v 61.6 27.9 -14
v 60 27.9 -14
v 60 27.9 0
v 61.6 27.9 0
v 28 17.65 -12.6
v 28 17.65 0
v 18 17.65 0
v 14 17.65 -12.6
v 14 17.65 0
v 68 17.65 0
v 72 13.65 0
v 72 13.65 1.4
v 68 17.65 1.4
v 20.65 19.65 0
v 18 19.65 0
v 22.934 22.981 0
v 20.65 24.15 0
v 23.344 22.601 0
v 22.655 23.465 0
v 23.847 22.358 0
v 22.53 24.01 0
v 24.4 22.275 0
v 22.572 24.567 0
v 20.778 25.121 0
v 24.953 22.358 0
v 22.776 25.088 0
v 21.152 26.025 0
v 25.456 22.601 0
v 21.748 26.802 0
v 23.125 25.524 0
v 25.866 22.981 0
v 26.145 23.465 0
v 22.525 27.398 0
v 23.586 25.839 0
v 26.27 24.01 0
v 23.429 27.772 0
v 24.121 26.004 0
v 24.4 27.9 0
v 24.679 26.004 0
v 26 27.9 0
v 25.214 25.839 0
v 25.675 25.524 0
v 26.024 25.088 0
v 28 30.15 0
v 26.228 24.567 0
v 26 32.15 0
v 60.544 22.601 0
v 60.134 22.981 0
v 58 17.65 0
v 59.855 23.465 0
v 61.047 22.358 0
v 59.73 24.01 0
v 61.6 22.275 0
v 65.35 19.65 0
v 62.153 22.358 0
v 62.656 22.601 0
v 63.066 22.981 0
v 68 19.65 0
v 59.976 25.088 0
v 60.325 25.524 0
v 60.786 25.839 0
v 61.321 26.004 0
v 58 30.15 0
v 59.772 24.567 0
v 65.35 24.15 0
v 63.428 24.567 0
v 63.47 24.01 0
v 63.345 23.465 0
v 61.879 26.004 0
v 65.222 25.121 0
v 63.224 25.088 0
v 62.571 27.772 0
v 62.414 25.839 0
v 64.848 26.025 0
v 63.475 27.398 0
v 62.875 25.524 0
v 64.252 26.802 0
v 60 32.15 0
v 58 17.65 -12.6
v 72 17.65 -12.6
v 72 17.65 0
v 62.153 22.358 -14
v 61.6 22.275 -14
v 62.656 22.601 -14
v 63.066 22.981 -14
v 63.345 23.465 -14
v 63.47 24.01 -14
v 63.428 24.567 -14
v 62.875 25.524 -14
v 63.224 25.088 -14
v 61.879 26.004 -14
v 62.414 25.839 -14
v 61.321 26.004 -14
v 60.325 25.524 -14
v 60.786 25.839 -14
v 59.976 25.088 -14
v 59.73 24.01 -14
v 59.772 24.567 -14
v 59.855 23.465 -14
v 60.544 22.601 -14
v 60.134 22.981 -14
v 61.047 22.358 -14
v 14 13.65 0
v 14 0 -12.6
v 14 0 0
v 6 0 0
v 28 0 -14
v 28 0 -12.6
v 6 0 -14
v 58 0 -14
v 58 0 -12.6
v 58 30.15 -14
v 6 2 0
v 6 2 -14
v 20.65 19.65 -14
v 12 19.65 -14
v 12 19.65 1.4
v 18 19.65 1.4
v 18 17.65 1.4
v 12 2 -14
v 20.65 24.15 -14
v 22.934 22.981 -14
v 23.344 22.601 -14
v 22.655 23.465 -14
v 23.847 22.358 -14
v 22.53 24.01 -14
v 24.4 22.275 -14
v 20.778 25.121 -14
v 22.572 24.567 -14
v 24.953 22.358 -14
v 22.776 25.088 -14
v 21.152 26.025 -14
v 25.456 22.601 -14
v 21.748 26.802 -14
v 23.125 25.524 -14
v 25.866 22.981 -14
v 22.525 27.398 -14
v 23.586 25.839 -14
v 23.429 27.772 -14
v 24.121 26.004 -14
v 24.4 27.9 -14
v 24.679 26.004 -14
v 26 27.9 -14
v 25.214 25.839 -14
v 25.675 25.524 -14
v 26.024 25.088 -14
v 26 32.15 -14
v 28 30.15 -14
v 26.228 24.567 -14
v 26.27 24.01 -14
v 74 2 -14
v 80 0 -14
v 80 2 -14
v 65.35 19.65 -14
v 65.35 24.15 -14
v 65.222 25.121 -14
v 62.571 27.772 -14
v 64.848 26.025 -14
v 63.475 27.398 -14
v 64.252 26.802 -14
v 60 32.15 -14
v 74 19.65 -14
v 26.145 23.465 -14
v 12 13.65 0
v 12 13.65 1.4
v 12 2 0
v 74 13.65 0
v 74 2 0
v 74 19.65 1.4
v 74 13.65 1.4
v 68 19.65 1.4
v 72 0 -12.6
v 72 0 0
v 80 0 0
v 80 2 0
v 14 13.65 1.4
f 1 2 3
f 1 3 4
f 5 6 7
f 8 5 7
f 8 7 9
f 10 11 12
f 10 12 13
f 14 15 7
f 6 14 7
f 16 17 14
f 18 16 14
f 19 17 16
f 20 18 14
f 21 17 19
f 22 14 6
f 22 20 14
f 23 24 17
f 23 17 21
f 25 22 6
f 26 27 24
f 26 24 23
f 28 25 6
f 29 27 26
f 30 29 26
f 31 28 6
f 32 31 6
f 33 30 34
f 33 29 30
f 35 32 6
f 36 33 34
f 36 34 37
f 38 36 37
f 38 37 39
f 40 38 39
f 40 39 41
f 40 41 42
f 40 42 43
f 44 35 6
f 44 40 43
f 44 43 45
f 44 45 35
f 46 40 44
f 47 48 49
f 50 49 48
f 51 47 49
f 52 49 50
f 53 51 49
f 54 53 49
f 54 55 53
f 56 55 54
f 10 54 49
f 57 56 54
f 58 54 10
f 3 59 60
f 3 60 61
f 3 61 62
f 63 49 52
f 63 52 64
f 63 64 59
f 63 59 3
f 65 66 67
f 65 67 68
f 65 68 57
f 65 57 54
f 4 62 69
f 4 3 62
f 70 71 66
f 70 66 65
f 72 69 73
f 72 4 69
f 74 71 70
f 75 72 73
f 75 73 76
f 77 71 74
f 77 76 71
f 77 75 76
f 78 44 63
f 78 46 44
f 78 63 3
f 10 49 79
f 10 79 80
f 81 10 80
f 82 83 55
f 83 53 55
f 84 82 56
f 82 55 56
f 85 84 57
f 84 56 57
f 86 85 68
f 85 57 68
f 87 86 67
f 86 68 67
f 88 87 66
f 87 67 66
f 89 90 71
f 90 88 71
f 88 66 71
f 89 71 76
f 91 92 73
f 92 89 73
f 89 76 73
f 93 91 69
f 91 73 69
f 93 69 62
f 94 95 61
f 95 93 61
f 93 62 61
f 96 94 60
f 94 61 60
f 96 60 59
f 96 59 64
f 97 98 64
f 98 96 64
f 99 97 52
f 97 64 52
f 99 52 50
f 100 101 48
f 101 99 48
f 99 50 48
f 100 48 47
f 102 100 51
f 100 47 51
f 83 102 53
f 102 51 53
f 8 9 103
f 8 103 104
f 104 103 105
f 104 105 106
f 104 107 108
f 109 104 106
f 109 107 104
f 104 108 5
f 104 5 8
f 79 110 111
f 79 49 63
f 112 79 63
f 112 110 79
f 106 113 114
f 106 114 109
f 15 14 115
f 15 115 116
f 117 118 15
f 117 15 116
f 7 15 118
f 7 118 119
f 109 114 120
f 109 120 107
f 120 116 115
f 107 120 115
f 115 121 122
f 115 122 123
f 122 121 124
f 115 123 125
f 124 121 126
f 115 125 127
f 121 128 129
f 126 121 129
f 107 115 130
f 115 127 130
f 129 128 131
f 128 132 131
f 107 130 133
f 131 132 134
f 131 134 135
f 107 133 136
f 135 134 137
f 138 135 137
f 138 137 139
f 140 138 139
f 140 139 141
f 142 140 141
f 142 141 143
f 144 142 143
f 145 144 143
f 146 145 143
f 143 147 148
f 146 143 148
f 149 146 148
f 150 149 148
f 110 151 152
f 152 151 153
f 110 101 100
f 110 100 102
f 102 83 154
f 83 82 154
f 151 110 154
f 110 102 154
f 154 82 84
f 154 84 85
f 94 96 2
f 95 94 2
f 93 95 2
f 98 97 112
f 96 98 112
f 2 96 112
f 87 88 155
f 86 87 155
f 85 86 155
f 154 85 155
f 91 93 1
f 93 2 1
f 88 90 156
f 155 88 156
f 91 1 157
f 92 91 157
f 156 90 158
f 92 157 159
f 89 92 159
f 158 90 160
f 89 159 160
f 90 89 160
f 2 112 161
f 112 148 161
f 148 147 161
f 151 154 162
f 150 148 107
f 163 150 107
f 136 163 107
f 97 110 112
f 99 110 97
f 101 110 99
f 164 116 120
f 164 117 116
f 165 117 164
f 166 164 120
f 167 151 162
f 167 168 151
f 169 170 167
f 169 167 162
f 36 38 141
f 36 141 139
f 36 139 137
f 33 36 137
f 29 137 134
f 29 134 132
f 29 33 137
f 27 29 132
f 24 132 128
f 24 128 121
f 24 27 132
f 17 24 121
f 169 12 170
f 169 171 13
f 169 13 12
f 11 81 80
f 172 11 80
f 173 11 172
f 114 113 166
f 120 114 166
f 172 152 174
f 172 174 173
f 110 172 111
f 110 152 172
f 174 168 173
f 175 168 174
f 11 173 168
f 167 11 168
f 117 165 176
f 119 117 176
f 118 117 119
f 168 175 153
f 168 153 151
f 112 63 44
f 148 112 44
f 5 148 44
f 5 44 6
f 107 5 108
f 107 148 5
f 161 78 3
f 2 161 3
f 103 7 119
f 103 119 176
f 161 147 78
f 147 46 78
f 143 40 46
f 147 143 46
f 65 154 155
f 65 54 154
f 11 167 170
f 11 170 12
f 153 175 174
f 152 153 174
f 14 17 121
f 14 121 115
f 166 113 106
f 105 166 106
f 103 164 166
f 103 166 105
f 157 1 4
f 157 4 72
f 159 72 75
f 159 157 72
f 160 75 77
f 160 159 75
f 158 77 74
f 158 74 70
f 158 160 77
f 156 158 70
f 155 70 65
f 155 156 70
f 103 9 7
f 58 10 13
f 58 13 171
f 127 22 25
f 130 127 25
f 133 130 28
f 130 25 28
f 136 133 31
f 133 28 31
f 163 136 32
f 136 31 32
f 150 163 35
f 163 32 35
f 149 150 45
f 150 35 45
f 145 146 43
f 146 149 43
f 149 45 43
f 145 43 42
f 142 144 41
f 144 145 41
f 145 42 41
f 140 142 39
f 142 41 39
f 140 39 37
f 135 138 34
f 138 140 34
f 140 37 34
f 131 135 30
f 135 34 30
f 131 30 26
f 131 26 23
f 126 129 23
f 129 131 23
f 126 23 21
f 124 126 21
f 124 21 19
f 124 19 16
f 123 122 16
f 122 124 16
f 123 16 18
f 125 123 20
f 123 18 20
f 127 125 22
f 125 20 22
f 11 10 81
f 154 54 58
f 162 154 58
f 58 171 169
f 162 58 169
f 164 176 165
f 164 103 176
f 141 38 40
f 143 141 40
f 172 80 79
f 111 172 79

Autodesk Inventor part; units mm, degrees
ref_plane "YZ Plane" through (0, 0, 0) normal (1, 0, 0) x (0, 1, 0)
ref_plane "XZ Plane" through (0, 0, 0) normal (0, 1, 0) x (-1, 0, 0)
ref_plane "XY Plane" through (0, 0, 0) normal (0, 0, 1) x (1, 0, 0)
sketch "スケッチ1" plane through (0, 0, 0) normal (0, 0, 1) x (1, 0, 0)
  line L0 (0, 0) -> (0, 17.65)
  line L1 (0, 17.65) -> (28, 17.65)
  line L2 (28, 17.65) -> (28, 30.15)
  line L3 (28, 30.15) -> (58, 30.15)
  line L4 (58, 30.15) -> (58, 0)
  line L5 (58, 0) -> (60, 0)
  line L6 (60, 0) -> (60, 32.15)
  line L7 (60, 32.15) -> (28, 32.15)
  line L8 (28, 32.15) -> (26, 32.15)
  line L9 (26, 32.15) -> (26, 19.65)
  line L10 (26, 19.65) -> (-2, 19.65)
  line L11 (-2, 19.65) -> (-2, 0)
  line L12 (-2, 0) -> (0, 0)
  dimension "d0" = 17.65
  dimension "d1" = 28
  dimension "d2" = 12.5
  dimension "d3" = 30
  dimension "d4" = 2
  dimension "d5" = 32.15
  dimension "d6" = 32
  dimension "d7" = 2
  dimension "d8" = 12.5
  dimension "d9" = 28
extrude "押し出し1" add sketch "スケッチ1" along normal blind 14
sketch "スケッチ2" plane through (60, 0, 0) normal (1, 0, 0) x (0, 0, -1)
  line L0 (0, 0) -> (-14, 0) projected
  line L1 (-14, 0) -> (0, 0)
  line L2 (0, 0) -> (0, 2)
  line L3 (0, 2) -> (-14, 2)
  line L4 (-14, 2) -> (-14, 0)
  dimension "d12" = 14
  dimension "d13" = 2
extrude "押し出し2" add sketch "スケッチ2" along normal blind 7
sketch "スケッチ3" plane through (-2, 0, 0) normal (-1, 0, 0) x (0, 0, 1)
  line L0 (14, 2) -> (0, 2) projected
  line L1 (0, 0) -> (14, 0)
  line L2 (14, 0) -> (14, 2)
  line L3 (14, 2) -> (0, 2)
  line L4 (0, 2) -> (0, 0)
  dimension "d16" = 14
extrude "押し出し3" add sketch "スケッチ3" along normal blind 7
sketch "スケッチ4" plane through (0, 0, 14) normal (0, 0, 1) x (1, 0, 0)
  line L0 (60, 32.15) -> (60, 24.15)
  line L1 (60, 24.15) -> (61.6, 24.15)
  arc A0 (61.6, 20.4) -> (61.6, 27.9) centre (61.6, 24.15) ccw
  line L2 (61.6, 24.15) -> (61.6, 20.4) construction
  line L3 (61.6, 24.15) -> (61.6, 27.9) construction
  line L4 (61.6, 27.9) -> (60, 27.9)
  line L5 (61.6, 20.4) -> (60, 20.4)
  line L6 (60, 2) -> (60, 32.15) projected
  line L7 (60, 27.9) -> (60, 20.4)
  point P0 (0, 0)
  dimension "d47" = 8
  dimension "d48" = 1.6
  dimension "d49" = 3.75
  dimension "d50" = 180
extrude "押し出し4" add sketch "スケッチ4" against normal blind 14
hole "穴3" at (61.6, 24.15, 14) direction (0, 0, -1) diameter 3.75 end through all
sketch "スケッチ7" plane through (0, 0, 14) normal (0, 0, 1) x (1, 0, 0)
  line L0 (60, 32.15) -> (26, 32.15) projected
  line L1 (26, 32.15) -> (26, 24.15)
  line L2 (26, 24.15) -> (24.4, 24.15)
  arc A0 (24.4, 27.9) -> (24.4, 20.4) centre (24.4, 24.15) ccw
  line L3 (24.4, 27.9) -> (26, 27.9)
  line L4 (24.4, 20.4) -> (26, 20.4)
  line L5 (26, 20.4) -> (26, 27.9)
  line L6 (26, 32.15) -> (26, 19.65) projected
  circle A1 centre (24.4, 24.15) radius 1.875
  point P0 (0, 0)
  dimension "d60" = 8
  dimension "d61" = 1.6
  dimension "d62" = 3.75
  dimension "d63" = 3.75
extrude "押し出し6" add sketch "スケッチ7" against normal blind 14 contours L1 A1 L5 L4 A0 L3 | L1 L5 A1 picked at (23.6929, 24.15)
hole "穴4" at (24.4, 24.15, 14) direction (0, 0, -1) diameter 3.75 end through all
sketch "スケッチ10" plane through (0, 17.65, 0) normal (0, -1, 0) x (1, 0, 0)
  line L0 (28, 14) -> (58, 14) projected
  line L1 (0, 0) -> (28, 0)
  line L2 (28, 0) -> (28, 14)
  line L3 (28, 14) -> (0, 14)
  line L4 (0, 14) -> (0, 0)
extrude "押し出し7" cut sketch "スケッチ10" against normal blind 0.6
sketch "スケッチ11" plane through (0, 0, 0) normal (0, -1, 0) x (1, 0, 0)
  line L0 (0, 14) -> (-9, 14) projected
  line L1 (60, 0) -> (67, 0) projected
  line L2 (-9, 14) -> (67, 14)
  line L3 (67, 14) -> (67, 0)
  line L4 (67, 0) -> (-9, 0)
  line L5 (-9, 0) -> (-9, 14)
  point P0 (0, 0)
extrude "押し出し8" cut sketch "スケッチ11" against normal blind 0.6
sketch "スケッチ12" plane through (0, 0, 14) normal (0, 0, 1) x (1, 0, 0)
  line L0 (-2, 19.65) -> (-2, 2) projected
  line L1 (-2, 19.65) -> (4, 19.65)
  line L2 (26, 19.65) -> (-2, 19.65) projected
  line L3 (4, 19.65) -> (4, 18.25)
  line L4 (0, 18.25) -> (28, 18.25) projected
  line L5 (4, 18.25) -> (0.2844, 14.5344)
  line L6 (4, 18.25) -> (9.2547, 18.25) construction
  line L7 (0.2844, 14.5344) -> (0, 14.25)
  line L8 (0, 0.6) -> (0, 18.25) projected
  line L9 (0, 14.25) -> (-2, 14.25)
  line L10 (-2, 14.25) -> (-2, 19.65)
  point P0 (0, 0)
  dimension "d79" = 6
  dimension "d80" = 135
extrude "押し出し9" add sketch "スケッチ12" along normal blind 2
sketch "スケッチ15" plane through (0, 0, 0) normal (0, 0, -1) x (-1, 0, 0)
  line L0 (0, 0.6) -> (0, 18.25) projected
  line L1 (0, 18.25) -> (-14, 18.25)
  line L2 (-14, 18.25) -> (-14, 0.6)
  line L3 (-14, 0.6) -> (0, 0.6)
  line L4 (0, 0.6) -> (0, 18.25)
  point P0 (0, 0)
  dimension "d88" = 14
extrude "押し出し11" add sketch "スケッチ15" against normal blind 1.4
sketch "スケッチ17" plane through (67, 0, 0) normal (1, 0, 0) x (0, 0, -1)
  line L0 (0, 0.6) -> (-14, 0.6) projected
  line L1 (0, 0.6) -> (-14, 0.6)
  line L2 (-14, 0.6) -> (-14, 9.5309)
  line L3 (-14, 9.5309) -> (0, 9.5309)
  line L4 (0, 9.5309) -> (0, 0.6)
  point P0 (0, 0)
extrude "押し出し13" cut sketch "スケッチ17" against normal blind 3
sketch "スケッチ18" plane through (-9, 0, 0) normal (-1, 0, 0) x (0, 0, 1)
  line L0 (0, 0.6) -> (14, 0.6) projected
  line L1 (0, 0.6) -> (14, 0.6)
  line L2 (14, 0.6) -> (14, 6.5)
  line L3 (14, 6.5) -> (0, 6.5)
  line L4 (0, 6.5) -> (0, 0.6)
  point P0 (0, 0)
extrude "押し出し14" cut sketch "スケッチ18" against normal blind 3
hole "穴5" at (-4, 2, 7) direction (0, -1, 0) diameter 2.4 end through all
hole "穴6" at (62, 2, 7) direction (0, -1, 0) diameter 2.4 end through all
mirror "ミラー1" about plane through (31.8158, 20.0509, 0) normal (0, 0, -1) of "押し出し3", "押し出し1", "押し出し4", "穴3", "押し出し2", "穴6", "穴4", "押し出し6", "押し出し7", "押し出し9", "押し出し11", "押し出し14", "押し出し13", "穴5", "押し出し8"
sketch "スケッチ19" plane through (0, 0, 14) normal (0, 0, 1) x (1, 0, 0)
  line L0 (94.8832, 81.412) -> (-62.365, 81.412)
  line L1 (-62.365, 81.412) -> (-62.365, -71.7744)
  line L2 (-62.365, -71.7744) -> (94.8832, -71.7744)
  line L3 (94.8832, -71.7744) -> (94.8832, 81.412)
  point P0 (0, 0)
extrude "押し出し15" cut sketch "スケッチ19" against normal blind 14
sketch "スケッチ20" plane through (-2, 19.65, 14) normal (0, 1, 0) x (1, 0, 0)
  line L0 (17.6833, -4.2941) -> (-12.6138, -4.2941)
  line L1 (-12.6138, -4.2941) -> (-12.6138, 1.0873)
  line L2 (-12.6138, 1.0873) -> (17.6833, 1.0873)
  line L3 (17.6833, 1.0873) -> (17.6833, -4.2941)
  point P0 (2, 14)
extrude "押し出し16" cut sketch "スケッチ20" against normal blind 14
sketch "スケッチ21" plane through (26, 27.9, -14) normal (-1, 0, 0) x (0, 0, 1)
  line L0 (0, -8.25) -> (-2, -8.25) projected
  line L1 (-2, -8.25) -> (18.9234, -8.25)
  line L2 (18.9234, -8.25) -> (18.9234, 5.2405)
  line L3 (18.9234, 5.2405) -> (-2, 5.2405)
  line L4 (-2, 5.2405) -> (-2, -8.25)
  point P0 (14, -27.9)
split body "分割1" sketch "スケッチ21" result one side removed curves L2 L3 L4 L1 removed pieces at (9.3333, 19.15, -4.6667) (58.5, 13.3, -4.6667)
sketch "スケッチ22" plane through (0, 0, 0) normal (0, 0, 1) x (1, 0, 0)
  line L0 (28, 19.65) -> (28, 30.15) projected
  line L1 (28, 19.65) -> (28, 17.65)
  line L2 (28, 17.65) -> (14, 17.65)
  line L3 (14, 17.65) -> (14, 0)
  line L4 (14, 17.65) -> (31.65, 17.65) construction
  line L5 (14, 0) -> (8, 0)
  line L6 (8, 0) -> (8, 2)
  line L7 (8, 2) -> (12, 2)
  line L8 (26.0798, 19.65) -> (12, 19.65)
  line L9 (12, 19.65) -> (12, 2)
  line L10 (58, 19.65) -> (60, 19.65) projected
  line L11 (58, 19.65) -> (58, 17.65)
  line L12 (58, 17.65) -> (72, 17.65)
  line L13 (72, 17.65) -> (72, 0)
  line L14 (72, 0) -> (78, 0)
  line L15 (78, 0) -> (78, 2)
  line L16 (78, 2) -> (74, 2)
  line L17 (74, 2) -> (74, 19.65)
  line L18 (74, 19.65) -> (60, 19.65)
  line L19 (26.0798, 19.65) -> (28, 19.65)
  line L20 (24.4, 20.4) -> (26, 20.4) projected
  line L21 (58, 19.65) -> (60, 19.65)
  point P0 (0, 0)
  dimension "d119" = 2
  dimension "d120" = 14
  dimension "d121" = 17.65
  dimension "d122" = 90
  dimension "d123" = 6
  dimension "d124" = 2
  dimension "d125" = 4
  dimension "d126" = 14
  dimension "d127" = 6
  dimension "d128" = 2
  dimension "d129" = 4
extrude "押し出し17" add sketch "スケッチ22" against normal blind 14
sketch "スケッチ23" plane through (26, 32.15, -14) normal (0, 1, 0) x (1, 0, 0)
  line L0 (32, -14) -> (2, -14) projected
  line L1 (17, -14) -> (17, 0)
  line L2 (2, 0) -> (32, 0) projected
  point P0 (-26, -14)
sketch "スケッチ25" plane through (24.4, 24.15, -14) normal (0, 0, -1) x (-1, 0, 0)
  line L0 (-3.6, -6.5) -> (10.4, -6.5) projected
  line L1 (10.4, -6.5) -> (-3.6, -6.5)
  line L2 (-3.6, -6.5) -> (-3.6, -24.15)
  line L3 (-3.6, -24.15) -> (10.4, -24.15)
  line L4 (10.4, -24.15) -> (10.4, -6.5)
  point P0 (24.4, -24.15)
extrude "押し出し18" add sketch "スケッチ25" against normal blind 1.4
ref_plane "作業平面1" through (43, 32.15, 0) normal (1, 0, 0) x (0, 0, -1)
mirror "ミラー3" about plane through (43, 32.15, 0) normal (1, 0, 0) of "押し出し18"
sketch "スケッチ26" plane through (0, 0, 0) normal (0, 0, 1) x (1, 0, 0)
  line L0 (12, 2) -> (12, 19.65) projected
  line L1 (12, 19.65) -> (18, 19.65)
  line L2 (12, 19.65) -> (26, 19.65) projected
  line L3 (18, 19.65) -> (18, 17.65)
  line L4 (28, 17.65) -> (14, 17.65) projected
  line L5 (18, 17.65) -> (14, 13.65)
  line L6 (14, 17.65) -> (14, 0) projected
  line L7 (18, 17.65) -> (23.6569, 17.65) construction
  line L8 (14, 13.65) -> (12, 13.65)
  line L9 (12, 13.65) -> (12, 19.65)
  point P0 (0, 0)
  dimension "d139" = 6
  dimension "d140" = 135
extrude "押し出し20" add sketch "スケッチ26" along normal blind 1.4
mirror "ミラー4" about plane through (43, 32.15, 0) normal (1, 0, 0) of "押し出し20"
sketch "スケッチ27" plane through (0, 0, 0) normal (0, 0, 1) x (1, 0, 0)
  line L0 (8, 2) -> (12, 2) projected
  line L1 (8, 2) -> (6, 2)
  line L2 (6, 2) -> (6, 0)
  line L3 (6, 0) -> (8, 0)
  line L4 (8, 0) -> (8, 2)
  line L5 (78, 2) -> (80, 2)
  line L6 (80, 2) -> (80, 0)
  line L7 (80, 0) -> (78, 0)
  line L8 (78, 0) -> (78, 2)
  point P0 (0, 0)
  dimension "d143" = 2
  dimension "d144" = 2
extrude "押し出し21" add sketch "スケッチ27" against normal blind 14
hole "穴7" at (77, 2, -7) direction (0, -1, 0) diameter 2.4 end through all
hole "穴8" at (9, 2, -7) direction (0, -1, 0) diameter 2.4 end through all
sketch "スケッチ28" plane through (0, 0, 0) normal (0, 0, 1) x (1, 0, 0)
  arc A0 (24.4, 27.9) -> (24.4, 20.4) centre (24.4, 24.15) ccw projected
  line L0 (20.65, 24.15) -> (20.65, 19.65)
  line L1 (12, 19.65) -> (26, 19.65) projected
  line L2 (24.4, 20.4) -> (26, 20.4) projected
  line L3 (26, 19.65) -> (26, 20.4)
  line L4 (26, 20.4) -> (20.65, 24.15)
  point P0 (0, 0)
extrude "押し出し22" add sketch "スケッチ28" against normal blind 14 contours A0 L2 L3 L1 L0
mirror "ミラー5" about plane through (43, 32.15, 0) normal (1, 0, 0) of "押し出し22"
sketch "スケッチ29" plane through (74, 2, 0) normal (0, 1, 0) x (1, 0, 0)
  circle A0 centre (3, 7) radius 1.2 projected
  circle A1 centre (3, 7) radius 1.2
  circle A2 centre (-65, 7) radius 1.2 projected
  circle A3 centre (-65, 7) radius 1.2
  point P0 (-74, 0)
extrude "押し出し23" add sketch "スケッチ29" against normal blind 2
properties part number "センサ冶具1セット穴埋めver"
